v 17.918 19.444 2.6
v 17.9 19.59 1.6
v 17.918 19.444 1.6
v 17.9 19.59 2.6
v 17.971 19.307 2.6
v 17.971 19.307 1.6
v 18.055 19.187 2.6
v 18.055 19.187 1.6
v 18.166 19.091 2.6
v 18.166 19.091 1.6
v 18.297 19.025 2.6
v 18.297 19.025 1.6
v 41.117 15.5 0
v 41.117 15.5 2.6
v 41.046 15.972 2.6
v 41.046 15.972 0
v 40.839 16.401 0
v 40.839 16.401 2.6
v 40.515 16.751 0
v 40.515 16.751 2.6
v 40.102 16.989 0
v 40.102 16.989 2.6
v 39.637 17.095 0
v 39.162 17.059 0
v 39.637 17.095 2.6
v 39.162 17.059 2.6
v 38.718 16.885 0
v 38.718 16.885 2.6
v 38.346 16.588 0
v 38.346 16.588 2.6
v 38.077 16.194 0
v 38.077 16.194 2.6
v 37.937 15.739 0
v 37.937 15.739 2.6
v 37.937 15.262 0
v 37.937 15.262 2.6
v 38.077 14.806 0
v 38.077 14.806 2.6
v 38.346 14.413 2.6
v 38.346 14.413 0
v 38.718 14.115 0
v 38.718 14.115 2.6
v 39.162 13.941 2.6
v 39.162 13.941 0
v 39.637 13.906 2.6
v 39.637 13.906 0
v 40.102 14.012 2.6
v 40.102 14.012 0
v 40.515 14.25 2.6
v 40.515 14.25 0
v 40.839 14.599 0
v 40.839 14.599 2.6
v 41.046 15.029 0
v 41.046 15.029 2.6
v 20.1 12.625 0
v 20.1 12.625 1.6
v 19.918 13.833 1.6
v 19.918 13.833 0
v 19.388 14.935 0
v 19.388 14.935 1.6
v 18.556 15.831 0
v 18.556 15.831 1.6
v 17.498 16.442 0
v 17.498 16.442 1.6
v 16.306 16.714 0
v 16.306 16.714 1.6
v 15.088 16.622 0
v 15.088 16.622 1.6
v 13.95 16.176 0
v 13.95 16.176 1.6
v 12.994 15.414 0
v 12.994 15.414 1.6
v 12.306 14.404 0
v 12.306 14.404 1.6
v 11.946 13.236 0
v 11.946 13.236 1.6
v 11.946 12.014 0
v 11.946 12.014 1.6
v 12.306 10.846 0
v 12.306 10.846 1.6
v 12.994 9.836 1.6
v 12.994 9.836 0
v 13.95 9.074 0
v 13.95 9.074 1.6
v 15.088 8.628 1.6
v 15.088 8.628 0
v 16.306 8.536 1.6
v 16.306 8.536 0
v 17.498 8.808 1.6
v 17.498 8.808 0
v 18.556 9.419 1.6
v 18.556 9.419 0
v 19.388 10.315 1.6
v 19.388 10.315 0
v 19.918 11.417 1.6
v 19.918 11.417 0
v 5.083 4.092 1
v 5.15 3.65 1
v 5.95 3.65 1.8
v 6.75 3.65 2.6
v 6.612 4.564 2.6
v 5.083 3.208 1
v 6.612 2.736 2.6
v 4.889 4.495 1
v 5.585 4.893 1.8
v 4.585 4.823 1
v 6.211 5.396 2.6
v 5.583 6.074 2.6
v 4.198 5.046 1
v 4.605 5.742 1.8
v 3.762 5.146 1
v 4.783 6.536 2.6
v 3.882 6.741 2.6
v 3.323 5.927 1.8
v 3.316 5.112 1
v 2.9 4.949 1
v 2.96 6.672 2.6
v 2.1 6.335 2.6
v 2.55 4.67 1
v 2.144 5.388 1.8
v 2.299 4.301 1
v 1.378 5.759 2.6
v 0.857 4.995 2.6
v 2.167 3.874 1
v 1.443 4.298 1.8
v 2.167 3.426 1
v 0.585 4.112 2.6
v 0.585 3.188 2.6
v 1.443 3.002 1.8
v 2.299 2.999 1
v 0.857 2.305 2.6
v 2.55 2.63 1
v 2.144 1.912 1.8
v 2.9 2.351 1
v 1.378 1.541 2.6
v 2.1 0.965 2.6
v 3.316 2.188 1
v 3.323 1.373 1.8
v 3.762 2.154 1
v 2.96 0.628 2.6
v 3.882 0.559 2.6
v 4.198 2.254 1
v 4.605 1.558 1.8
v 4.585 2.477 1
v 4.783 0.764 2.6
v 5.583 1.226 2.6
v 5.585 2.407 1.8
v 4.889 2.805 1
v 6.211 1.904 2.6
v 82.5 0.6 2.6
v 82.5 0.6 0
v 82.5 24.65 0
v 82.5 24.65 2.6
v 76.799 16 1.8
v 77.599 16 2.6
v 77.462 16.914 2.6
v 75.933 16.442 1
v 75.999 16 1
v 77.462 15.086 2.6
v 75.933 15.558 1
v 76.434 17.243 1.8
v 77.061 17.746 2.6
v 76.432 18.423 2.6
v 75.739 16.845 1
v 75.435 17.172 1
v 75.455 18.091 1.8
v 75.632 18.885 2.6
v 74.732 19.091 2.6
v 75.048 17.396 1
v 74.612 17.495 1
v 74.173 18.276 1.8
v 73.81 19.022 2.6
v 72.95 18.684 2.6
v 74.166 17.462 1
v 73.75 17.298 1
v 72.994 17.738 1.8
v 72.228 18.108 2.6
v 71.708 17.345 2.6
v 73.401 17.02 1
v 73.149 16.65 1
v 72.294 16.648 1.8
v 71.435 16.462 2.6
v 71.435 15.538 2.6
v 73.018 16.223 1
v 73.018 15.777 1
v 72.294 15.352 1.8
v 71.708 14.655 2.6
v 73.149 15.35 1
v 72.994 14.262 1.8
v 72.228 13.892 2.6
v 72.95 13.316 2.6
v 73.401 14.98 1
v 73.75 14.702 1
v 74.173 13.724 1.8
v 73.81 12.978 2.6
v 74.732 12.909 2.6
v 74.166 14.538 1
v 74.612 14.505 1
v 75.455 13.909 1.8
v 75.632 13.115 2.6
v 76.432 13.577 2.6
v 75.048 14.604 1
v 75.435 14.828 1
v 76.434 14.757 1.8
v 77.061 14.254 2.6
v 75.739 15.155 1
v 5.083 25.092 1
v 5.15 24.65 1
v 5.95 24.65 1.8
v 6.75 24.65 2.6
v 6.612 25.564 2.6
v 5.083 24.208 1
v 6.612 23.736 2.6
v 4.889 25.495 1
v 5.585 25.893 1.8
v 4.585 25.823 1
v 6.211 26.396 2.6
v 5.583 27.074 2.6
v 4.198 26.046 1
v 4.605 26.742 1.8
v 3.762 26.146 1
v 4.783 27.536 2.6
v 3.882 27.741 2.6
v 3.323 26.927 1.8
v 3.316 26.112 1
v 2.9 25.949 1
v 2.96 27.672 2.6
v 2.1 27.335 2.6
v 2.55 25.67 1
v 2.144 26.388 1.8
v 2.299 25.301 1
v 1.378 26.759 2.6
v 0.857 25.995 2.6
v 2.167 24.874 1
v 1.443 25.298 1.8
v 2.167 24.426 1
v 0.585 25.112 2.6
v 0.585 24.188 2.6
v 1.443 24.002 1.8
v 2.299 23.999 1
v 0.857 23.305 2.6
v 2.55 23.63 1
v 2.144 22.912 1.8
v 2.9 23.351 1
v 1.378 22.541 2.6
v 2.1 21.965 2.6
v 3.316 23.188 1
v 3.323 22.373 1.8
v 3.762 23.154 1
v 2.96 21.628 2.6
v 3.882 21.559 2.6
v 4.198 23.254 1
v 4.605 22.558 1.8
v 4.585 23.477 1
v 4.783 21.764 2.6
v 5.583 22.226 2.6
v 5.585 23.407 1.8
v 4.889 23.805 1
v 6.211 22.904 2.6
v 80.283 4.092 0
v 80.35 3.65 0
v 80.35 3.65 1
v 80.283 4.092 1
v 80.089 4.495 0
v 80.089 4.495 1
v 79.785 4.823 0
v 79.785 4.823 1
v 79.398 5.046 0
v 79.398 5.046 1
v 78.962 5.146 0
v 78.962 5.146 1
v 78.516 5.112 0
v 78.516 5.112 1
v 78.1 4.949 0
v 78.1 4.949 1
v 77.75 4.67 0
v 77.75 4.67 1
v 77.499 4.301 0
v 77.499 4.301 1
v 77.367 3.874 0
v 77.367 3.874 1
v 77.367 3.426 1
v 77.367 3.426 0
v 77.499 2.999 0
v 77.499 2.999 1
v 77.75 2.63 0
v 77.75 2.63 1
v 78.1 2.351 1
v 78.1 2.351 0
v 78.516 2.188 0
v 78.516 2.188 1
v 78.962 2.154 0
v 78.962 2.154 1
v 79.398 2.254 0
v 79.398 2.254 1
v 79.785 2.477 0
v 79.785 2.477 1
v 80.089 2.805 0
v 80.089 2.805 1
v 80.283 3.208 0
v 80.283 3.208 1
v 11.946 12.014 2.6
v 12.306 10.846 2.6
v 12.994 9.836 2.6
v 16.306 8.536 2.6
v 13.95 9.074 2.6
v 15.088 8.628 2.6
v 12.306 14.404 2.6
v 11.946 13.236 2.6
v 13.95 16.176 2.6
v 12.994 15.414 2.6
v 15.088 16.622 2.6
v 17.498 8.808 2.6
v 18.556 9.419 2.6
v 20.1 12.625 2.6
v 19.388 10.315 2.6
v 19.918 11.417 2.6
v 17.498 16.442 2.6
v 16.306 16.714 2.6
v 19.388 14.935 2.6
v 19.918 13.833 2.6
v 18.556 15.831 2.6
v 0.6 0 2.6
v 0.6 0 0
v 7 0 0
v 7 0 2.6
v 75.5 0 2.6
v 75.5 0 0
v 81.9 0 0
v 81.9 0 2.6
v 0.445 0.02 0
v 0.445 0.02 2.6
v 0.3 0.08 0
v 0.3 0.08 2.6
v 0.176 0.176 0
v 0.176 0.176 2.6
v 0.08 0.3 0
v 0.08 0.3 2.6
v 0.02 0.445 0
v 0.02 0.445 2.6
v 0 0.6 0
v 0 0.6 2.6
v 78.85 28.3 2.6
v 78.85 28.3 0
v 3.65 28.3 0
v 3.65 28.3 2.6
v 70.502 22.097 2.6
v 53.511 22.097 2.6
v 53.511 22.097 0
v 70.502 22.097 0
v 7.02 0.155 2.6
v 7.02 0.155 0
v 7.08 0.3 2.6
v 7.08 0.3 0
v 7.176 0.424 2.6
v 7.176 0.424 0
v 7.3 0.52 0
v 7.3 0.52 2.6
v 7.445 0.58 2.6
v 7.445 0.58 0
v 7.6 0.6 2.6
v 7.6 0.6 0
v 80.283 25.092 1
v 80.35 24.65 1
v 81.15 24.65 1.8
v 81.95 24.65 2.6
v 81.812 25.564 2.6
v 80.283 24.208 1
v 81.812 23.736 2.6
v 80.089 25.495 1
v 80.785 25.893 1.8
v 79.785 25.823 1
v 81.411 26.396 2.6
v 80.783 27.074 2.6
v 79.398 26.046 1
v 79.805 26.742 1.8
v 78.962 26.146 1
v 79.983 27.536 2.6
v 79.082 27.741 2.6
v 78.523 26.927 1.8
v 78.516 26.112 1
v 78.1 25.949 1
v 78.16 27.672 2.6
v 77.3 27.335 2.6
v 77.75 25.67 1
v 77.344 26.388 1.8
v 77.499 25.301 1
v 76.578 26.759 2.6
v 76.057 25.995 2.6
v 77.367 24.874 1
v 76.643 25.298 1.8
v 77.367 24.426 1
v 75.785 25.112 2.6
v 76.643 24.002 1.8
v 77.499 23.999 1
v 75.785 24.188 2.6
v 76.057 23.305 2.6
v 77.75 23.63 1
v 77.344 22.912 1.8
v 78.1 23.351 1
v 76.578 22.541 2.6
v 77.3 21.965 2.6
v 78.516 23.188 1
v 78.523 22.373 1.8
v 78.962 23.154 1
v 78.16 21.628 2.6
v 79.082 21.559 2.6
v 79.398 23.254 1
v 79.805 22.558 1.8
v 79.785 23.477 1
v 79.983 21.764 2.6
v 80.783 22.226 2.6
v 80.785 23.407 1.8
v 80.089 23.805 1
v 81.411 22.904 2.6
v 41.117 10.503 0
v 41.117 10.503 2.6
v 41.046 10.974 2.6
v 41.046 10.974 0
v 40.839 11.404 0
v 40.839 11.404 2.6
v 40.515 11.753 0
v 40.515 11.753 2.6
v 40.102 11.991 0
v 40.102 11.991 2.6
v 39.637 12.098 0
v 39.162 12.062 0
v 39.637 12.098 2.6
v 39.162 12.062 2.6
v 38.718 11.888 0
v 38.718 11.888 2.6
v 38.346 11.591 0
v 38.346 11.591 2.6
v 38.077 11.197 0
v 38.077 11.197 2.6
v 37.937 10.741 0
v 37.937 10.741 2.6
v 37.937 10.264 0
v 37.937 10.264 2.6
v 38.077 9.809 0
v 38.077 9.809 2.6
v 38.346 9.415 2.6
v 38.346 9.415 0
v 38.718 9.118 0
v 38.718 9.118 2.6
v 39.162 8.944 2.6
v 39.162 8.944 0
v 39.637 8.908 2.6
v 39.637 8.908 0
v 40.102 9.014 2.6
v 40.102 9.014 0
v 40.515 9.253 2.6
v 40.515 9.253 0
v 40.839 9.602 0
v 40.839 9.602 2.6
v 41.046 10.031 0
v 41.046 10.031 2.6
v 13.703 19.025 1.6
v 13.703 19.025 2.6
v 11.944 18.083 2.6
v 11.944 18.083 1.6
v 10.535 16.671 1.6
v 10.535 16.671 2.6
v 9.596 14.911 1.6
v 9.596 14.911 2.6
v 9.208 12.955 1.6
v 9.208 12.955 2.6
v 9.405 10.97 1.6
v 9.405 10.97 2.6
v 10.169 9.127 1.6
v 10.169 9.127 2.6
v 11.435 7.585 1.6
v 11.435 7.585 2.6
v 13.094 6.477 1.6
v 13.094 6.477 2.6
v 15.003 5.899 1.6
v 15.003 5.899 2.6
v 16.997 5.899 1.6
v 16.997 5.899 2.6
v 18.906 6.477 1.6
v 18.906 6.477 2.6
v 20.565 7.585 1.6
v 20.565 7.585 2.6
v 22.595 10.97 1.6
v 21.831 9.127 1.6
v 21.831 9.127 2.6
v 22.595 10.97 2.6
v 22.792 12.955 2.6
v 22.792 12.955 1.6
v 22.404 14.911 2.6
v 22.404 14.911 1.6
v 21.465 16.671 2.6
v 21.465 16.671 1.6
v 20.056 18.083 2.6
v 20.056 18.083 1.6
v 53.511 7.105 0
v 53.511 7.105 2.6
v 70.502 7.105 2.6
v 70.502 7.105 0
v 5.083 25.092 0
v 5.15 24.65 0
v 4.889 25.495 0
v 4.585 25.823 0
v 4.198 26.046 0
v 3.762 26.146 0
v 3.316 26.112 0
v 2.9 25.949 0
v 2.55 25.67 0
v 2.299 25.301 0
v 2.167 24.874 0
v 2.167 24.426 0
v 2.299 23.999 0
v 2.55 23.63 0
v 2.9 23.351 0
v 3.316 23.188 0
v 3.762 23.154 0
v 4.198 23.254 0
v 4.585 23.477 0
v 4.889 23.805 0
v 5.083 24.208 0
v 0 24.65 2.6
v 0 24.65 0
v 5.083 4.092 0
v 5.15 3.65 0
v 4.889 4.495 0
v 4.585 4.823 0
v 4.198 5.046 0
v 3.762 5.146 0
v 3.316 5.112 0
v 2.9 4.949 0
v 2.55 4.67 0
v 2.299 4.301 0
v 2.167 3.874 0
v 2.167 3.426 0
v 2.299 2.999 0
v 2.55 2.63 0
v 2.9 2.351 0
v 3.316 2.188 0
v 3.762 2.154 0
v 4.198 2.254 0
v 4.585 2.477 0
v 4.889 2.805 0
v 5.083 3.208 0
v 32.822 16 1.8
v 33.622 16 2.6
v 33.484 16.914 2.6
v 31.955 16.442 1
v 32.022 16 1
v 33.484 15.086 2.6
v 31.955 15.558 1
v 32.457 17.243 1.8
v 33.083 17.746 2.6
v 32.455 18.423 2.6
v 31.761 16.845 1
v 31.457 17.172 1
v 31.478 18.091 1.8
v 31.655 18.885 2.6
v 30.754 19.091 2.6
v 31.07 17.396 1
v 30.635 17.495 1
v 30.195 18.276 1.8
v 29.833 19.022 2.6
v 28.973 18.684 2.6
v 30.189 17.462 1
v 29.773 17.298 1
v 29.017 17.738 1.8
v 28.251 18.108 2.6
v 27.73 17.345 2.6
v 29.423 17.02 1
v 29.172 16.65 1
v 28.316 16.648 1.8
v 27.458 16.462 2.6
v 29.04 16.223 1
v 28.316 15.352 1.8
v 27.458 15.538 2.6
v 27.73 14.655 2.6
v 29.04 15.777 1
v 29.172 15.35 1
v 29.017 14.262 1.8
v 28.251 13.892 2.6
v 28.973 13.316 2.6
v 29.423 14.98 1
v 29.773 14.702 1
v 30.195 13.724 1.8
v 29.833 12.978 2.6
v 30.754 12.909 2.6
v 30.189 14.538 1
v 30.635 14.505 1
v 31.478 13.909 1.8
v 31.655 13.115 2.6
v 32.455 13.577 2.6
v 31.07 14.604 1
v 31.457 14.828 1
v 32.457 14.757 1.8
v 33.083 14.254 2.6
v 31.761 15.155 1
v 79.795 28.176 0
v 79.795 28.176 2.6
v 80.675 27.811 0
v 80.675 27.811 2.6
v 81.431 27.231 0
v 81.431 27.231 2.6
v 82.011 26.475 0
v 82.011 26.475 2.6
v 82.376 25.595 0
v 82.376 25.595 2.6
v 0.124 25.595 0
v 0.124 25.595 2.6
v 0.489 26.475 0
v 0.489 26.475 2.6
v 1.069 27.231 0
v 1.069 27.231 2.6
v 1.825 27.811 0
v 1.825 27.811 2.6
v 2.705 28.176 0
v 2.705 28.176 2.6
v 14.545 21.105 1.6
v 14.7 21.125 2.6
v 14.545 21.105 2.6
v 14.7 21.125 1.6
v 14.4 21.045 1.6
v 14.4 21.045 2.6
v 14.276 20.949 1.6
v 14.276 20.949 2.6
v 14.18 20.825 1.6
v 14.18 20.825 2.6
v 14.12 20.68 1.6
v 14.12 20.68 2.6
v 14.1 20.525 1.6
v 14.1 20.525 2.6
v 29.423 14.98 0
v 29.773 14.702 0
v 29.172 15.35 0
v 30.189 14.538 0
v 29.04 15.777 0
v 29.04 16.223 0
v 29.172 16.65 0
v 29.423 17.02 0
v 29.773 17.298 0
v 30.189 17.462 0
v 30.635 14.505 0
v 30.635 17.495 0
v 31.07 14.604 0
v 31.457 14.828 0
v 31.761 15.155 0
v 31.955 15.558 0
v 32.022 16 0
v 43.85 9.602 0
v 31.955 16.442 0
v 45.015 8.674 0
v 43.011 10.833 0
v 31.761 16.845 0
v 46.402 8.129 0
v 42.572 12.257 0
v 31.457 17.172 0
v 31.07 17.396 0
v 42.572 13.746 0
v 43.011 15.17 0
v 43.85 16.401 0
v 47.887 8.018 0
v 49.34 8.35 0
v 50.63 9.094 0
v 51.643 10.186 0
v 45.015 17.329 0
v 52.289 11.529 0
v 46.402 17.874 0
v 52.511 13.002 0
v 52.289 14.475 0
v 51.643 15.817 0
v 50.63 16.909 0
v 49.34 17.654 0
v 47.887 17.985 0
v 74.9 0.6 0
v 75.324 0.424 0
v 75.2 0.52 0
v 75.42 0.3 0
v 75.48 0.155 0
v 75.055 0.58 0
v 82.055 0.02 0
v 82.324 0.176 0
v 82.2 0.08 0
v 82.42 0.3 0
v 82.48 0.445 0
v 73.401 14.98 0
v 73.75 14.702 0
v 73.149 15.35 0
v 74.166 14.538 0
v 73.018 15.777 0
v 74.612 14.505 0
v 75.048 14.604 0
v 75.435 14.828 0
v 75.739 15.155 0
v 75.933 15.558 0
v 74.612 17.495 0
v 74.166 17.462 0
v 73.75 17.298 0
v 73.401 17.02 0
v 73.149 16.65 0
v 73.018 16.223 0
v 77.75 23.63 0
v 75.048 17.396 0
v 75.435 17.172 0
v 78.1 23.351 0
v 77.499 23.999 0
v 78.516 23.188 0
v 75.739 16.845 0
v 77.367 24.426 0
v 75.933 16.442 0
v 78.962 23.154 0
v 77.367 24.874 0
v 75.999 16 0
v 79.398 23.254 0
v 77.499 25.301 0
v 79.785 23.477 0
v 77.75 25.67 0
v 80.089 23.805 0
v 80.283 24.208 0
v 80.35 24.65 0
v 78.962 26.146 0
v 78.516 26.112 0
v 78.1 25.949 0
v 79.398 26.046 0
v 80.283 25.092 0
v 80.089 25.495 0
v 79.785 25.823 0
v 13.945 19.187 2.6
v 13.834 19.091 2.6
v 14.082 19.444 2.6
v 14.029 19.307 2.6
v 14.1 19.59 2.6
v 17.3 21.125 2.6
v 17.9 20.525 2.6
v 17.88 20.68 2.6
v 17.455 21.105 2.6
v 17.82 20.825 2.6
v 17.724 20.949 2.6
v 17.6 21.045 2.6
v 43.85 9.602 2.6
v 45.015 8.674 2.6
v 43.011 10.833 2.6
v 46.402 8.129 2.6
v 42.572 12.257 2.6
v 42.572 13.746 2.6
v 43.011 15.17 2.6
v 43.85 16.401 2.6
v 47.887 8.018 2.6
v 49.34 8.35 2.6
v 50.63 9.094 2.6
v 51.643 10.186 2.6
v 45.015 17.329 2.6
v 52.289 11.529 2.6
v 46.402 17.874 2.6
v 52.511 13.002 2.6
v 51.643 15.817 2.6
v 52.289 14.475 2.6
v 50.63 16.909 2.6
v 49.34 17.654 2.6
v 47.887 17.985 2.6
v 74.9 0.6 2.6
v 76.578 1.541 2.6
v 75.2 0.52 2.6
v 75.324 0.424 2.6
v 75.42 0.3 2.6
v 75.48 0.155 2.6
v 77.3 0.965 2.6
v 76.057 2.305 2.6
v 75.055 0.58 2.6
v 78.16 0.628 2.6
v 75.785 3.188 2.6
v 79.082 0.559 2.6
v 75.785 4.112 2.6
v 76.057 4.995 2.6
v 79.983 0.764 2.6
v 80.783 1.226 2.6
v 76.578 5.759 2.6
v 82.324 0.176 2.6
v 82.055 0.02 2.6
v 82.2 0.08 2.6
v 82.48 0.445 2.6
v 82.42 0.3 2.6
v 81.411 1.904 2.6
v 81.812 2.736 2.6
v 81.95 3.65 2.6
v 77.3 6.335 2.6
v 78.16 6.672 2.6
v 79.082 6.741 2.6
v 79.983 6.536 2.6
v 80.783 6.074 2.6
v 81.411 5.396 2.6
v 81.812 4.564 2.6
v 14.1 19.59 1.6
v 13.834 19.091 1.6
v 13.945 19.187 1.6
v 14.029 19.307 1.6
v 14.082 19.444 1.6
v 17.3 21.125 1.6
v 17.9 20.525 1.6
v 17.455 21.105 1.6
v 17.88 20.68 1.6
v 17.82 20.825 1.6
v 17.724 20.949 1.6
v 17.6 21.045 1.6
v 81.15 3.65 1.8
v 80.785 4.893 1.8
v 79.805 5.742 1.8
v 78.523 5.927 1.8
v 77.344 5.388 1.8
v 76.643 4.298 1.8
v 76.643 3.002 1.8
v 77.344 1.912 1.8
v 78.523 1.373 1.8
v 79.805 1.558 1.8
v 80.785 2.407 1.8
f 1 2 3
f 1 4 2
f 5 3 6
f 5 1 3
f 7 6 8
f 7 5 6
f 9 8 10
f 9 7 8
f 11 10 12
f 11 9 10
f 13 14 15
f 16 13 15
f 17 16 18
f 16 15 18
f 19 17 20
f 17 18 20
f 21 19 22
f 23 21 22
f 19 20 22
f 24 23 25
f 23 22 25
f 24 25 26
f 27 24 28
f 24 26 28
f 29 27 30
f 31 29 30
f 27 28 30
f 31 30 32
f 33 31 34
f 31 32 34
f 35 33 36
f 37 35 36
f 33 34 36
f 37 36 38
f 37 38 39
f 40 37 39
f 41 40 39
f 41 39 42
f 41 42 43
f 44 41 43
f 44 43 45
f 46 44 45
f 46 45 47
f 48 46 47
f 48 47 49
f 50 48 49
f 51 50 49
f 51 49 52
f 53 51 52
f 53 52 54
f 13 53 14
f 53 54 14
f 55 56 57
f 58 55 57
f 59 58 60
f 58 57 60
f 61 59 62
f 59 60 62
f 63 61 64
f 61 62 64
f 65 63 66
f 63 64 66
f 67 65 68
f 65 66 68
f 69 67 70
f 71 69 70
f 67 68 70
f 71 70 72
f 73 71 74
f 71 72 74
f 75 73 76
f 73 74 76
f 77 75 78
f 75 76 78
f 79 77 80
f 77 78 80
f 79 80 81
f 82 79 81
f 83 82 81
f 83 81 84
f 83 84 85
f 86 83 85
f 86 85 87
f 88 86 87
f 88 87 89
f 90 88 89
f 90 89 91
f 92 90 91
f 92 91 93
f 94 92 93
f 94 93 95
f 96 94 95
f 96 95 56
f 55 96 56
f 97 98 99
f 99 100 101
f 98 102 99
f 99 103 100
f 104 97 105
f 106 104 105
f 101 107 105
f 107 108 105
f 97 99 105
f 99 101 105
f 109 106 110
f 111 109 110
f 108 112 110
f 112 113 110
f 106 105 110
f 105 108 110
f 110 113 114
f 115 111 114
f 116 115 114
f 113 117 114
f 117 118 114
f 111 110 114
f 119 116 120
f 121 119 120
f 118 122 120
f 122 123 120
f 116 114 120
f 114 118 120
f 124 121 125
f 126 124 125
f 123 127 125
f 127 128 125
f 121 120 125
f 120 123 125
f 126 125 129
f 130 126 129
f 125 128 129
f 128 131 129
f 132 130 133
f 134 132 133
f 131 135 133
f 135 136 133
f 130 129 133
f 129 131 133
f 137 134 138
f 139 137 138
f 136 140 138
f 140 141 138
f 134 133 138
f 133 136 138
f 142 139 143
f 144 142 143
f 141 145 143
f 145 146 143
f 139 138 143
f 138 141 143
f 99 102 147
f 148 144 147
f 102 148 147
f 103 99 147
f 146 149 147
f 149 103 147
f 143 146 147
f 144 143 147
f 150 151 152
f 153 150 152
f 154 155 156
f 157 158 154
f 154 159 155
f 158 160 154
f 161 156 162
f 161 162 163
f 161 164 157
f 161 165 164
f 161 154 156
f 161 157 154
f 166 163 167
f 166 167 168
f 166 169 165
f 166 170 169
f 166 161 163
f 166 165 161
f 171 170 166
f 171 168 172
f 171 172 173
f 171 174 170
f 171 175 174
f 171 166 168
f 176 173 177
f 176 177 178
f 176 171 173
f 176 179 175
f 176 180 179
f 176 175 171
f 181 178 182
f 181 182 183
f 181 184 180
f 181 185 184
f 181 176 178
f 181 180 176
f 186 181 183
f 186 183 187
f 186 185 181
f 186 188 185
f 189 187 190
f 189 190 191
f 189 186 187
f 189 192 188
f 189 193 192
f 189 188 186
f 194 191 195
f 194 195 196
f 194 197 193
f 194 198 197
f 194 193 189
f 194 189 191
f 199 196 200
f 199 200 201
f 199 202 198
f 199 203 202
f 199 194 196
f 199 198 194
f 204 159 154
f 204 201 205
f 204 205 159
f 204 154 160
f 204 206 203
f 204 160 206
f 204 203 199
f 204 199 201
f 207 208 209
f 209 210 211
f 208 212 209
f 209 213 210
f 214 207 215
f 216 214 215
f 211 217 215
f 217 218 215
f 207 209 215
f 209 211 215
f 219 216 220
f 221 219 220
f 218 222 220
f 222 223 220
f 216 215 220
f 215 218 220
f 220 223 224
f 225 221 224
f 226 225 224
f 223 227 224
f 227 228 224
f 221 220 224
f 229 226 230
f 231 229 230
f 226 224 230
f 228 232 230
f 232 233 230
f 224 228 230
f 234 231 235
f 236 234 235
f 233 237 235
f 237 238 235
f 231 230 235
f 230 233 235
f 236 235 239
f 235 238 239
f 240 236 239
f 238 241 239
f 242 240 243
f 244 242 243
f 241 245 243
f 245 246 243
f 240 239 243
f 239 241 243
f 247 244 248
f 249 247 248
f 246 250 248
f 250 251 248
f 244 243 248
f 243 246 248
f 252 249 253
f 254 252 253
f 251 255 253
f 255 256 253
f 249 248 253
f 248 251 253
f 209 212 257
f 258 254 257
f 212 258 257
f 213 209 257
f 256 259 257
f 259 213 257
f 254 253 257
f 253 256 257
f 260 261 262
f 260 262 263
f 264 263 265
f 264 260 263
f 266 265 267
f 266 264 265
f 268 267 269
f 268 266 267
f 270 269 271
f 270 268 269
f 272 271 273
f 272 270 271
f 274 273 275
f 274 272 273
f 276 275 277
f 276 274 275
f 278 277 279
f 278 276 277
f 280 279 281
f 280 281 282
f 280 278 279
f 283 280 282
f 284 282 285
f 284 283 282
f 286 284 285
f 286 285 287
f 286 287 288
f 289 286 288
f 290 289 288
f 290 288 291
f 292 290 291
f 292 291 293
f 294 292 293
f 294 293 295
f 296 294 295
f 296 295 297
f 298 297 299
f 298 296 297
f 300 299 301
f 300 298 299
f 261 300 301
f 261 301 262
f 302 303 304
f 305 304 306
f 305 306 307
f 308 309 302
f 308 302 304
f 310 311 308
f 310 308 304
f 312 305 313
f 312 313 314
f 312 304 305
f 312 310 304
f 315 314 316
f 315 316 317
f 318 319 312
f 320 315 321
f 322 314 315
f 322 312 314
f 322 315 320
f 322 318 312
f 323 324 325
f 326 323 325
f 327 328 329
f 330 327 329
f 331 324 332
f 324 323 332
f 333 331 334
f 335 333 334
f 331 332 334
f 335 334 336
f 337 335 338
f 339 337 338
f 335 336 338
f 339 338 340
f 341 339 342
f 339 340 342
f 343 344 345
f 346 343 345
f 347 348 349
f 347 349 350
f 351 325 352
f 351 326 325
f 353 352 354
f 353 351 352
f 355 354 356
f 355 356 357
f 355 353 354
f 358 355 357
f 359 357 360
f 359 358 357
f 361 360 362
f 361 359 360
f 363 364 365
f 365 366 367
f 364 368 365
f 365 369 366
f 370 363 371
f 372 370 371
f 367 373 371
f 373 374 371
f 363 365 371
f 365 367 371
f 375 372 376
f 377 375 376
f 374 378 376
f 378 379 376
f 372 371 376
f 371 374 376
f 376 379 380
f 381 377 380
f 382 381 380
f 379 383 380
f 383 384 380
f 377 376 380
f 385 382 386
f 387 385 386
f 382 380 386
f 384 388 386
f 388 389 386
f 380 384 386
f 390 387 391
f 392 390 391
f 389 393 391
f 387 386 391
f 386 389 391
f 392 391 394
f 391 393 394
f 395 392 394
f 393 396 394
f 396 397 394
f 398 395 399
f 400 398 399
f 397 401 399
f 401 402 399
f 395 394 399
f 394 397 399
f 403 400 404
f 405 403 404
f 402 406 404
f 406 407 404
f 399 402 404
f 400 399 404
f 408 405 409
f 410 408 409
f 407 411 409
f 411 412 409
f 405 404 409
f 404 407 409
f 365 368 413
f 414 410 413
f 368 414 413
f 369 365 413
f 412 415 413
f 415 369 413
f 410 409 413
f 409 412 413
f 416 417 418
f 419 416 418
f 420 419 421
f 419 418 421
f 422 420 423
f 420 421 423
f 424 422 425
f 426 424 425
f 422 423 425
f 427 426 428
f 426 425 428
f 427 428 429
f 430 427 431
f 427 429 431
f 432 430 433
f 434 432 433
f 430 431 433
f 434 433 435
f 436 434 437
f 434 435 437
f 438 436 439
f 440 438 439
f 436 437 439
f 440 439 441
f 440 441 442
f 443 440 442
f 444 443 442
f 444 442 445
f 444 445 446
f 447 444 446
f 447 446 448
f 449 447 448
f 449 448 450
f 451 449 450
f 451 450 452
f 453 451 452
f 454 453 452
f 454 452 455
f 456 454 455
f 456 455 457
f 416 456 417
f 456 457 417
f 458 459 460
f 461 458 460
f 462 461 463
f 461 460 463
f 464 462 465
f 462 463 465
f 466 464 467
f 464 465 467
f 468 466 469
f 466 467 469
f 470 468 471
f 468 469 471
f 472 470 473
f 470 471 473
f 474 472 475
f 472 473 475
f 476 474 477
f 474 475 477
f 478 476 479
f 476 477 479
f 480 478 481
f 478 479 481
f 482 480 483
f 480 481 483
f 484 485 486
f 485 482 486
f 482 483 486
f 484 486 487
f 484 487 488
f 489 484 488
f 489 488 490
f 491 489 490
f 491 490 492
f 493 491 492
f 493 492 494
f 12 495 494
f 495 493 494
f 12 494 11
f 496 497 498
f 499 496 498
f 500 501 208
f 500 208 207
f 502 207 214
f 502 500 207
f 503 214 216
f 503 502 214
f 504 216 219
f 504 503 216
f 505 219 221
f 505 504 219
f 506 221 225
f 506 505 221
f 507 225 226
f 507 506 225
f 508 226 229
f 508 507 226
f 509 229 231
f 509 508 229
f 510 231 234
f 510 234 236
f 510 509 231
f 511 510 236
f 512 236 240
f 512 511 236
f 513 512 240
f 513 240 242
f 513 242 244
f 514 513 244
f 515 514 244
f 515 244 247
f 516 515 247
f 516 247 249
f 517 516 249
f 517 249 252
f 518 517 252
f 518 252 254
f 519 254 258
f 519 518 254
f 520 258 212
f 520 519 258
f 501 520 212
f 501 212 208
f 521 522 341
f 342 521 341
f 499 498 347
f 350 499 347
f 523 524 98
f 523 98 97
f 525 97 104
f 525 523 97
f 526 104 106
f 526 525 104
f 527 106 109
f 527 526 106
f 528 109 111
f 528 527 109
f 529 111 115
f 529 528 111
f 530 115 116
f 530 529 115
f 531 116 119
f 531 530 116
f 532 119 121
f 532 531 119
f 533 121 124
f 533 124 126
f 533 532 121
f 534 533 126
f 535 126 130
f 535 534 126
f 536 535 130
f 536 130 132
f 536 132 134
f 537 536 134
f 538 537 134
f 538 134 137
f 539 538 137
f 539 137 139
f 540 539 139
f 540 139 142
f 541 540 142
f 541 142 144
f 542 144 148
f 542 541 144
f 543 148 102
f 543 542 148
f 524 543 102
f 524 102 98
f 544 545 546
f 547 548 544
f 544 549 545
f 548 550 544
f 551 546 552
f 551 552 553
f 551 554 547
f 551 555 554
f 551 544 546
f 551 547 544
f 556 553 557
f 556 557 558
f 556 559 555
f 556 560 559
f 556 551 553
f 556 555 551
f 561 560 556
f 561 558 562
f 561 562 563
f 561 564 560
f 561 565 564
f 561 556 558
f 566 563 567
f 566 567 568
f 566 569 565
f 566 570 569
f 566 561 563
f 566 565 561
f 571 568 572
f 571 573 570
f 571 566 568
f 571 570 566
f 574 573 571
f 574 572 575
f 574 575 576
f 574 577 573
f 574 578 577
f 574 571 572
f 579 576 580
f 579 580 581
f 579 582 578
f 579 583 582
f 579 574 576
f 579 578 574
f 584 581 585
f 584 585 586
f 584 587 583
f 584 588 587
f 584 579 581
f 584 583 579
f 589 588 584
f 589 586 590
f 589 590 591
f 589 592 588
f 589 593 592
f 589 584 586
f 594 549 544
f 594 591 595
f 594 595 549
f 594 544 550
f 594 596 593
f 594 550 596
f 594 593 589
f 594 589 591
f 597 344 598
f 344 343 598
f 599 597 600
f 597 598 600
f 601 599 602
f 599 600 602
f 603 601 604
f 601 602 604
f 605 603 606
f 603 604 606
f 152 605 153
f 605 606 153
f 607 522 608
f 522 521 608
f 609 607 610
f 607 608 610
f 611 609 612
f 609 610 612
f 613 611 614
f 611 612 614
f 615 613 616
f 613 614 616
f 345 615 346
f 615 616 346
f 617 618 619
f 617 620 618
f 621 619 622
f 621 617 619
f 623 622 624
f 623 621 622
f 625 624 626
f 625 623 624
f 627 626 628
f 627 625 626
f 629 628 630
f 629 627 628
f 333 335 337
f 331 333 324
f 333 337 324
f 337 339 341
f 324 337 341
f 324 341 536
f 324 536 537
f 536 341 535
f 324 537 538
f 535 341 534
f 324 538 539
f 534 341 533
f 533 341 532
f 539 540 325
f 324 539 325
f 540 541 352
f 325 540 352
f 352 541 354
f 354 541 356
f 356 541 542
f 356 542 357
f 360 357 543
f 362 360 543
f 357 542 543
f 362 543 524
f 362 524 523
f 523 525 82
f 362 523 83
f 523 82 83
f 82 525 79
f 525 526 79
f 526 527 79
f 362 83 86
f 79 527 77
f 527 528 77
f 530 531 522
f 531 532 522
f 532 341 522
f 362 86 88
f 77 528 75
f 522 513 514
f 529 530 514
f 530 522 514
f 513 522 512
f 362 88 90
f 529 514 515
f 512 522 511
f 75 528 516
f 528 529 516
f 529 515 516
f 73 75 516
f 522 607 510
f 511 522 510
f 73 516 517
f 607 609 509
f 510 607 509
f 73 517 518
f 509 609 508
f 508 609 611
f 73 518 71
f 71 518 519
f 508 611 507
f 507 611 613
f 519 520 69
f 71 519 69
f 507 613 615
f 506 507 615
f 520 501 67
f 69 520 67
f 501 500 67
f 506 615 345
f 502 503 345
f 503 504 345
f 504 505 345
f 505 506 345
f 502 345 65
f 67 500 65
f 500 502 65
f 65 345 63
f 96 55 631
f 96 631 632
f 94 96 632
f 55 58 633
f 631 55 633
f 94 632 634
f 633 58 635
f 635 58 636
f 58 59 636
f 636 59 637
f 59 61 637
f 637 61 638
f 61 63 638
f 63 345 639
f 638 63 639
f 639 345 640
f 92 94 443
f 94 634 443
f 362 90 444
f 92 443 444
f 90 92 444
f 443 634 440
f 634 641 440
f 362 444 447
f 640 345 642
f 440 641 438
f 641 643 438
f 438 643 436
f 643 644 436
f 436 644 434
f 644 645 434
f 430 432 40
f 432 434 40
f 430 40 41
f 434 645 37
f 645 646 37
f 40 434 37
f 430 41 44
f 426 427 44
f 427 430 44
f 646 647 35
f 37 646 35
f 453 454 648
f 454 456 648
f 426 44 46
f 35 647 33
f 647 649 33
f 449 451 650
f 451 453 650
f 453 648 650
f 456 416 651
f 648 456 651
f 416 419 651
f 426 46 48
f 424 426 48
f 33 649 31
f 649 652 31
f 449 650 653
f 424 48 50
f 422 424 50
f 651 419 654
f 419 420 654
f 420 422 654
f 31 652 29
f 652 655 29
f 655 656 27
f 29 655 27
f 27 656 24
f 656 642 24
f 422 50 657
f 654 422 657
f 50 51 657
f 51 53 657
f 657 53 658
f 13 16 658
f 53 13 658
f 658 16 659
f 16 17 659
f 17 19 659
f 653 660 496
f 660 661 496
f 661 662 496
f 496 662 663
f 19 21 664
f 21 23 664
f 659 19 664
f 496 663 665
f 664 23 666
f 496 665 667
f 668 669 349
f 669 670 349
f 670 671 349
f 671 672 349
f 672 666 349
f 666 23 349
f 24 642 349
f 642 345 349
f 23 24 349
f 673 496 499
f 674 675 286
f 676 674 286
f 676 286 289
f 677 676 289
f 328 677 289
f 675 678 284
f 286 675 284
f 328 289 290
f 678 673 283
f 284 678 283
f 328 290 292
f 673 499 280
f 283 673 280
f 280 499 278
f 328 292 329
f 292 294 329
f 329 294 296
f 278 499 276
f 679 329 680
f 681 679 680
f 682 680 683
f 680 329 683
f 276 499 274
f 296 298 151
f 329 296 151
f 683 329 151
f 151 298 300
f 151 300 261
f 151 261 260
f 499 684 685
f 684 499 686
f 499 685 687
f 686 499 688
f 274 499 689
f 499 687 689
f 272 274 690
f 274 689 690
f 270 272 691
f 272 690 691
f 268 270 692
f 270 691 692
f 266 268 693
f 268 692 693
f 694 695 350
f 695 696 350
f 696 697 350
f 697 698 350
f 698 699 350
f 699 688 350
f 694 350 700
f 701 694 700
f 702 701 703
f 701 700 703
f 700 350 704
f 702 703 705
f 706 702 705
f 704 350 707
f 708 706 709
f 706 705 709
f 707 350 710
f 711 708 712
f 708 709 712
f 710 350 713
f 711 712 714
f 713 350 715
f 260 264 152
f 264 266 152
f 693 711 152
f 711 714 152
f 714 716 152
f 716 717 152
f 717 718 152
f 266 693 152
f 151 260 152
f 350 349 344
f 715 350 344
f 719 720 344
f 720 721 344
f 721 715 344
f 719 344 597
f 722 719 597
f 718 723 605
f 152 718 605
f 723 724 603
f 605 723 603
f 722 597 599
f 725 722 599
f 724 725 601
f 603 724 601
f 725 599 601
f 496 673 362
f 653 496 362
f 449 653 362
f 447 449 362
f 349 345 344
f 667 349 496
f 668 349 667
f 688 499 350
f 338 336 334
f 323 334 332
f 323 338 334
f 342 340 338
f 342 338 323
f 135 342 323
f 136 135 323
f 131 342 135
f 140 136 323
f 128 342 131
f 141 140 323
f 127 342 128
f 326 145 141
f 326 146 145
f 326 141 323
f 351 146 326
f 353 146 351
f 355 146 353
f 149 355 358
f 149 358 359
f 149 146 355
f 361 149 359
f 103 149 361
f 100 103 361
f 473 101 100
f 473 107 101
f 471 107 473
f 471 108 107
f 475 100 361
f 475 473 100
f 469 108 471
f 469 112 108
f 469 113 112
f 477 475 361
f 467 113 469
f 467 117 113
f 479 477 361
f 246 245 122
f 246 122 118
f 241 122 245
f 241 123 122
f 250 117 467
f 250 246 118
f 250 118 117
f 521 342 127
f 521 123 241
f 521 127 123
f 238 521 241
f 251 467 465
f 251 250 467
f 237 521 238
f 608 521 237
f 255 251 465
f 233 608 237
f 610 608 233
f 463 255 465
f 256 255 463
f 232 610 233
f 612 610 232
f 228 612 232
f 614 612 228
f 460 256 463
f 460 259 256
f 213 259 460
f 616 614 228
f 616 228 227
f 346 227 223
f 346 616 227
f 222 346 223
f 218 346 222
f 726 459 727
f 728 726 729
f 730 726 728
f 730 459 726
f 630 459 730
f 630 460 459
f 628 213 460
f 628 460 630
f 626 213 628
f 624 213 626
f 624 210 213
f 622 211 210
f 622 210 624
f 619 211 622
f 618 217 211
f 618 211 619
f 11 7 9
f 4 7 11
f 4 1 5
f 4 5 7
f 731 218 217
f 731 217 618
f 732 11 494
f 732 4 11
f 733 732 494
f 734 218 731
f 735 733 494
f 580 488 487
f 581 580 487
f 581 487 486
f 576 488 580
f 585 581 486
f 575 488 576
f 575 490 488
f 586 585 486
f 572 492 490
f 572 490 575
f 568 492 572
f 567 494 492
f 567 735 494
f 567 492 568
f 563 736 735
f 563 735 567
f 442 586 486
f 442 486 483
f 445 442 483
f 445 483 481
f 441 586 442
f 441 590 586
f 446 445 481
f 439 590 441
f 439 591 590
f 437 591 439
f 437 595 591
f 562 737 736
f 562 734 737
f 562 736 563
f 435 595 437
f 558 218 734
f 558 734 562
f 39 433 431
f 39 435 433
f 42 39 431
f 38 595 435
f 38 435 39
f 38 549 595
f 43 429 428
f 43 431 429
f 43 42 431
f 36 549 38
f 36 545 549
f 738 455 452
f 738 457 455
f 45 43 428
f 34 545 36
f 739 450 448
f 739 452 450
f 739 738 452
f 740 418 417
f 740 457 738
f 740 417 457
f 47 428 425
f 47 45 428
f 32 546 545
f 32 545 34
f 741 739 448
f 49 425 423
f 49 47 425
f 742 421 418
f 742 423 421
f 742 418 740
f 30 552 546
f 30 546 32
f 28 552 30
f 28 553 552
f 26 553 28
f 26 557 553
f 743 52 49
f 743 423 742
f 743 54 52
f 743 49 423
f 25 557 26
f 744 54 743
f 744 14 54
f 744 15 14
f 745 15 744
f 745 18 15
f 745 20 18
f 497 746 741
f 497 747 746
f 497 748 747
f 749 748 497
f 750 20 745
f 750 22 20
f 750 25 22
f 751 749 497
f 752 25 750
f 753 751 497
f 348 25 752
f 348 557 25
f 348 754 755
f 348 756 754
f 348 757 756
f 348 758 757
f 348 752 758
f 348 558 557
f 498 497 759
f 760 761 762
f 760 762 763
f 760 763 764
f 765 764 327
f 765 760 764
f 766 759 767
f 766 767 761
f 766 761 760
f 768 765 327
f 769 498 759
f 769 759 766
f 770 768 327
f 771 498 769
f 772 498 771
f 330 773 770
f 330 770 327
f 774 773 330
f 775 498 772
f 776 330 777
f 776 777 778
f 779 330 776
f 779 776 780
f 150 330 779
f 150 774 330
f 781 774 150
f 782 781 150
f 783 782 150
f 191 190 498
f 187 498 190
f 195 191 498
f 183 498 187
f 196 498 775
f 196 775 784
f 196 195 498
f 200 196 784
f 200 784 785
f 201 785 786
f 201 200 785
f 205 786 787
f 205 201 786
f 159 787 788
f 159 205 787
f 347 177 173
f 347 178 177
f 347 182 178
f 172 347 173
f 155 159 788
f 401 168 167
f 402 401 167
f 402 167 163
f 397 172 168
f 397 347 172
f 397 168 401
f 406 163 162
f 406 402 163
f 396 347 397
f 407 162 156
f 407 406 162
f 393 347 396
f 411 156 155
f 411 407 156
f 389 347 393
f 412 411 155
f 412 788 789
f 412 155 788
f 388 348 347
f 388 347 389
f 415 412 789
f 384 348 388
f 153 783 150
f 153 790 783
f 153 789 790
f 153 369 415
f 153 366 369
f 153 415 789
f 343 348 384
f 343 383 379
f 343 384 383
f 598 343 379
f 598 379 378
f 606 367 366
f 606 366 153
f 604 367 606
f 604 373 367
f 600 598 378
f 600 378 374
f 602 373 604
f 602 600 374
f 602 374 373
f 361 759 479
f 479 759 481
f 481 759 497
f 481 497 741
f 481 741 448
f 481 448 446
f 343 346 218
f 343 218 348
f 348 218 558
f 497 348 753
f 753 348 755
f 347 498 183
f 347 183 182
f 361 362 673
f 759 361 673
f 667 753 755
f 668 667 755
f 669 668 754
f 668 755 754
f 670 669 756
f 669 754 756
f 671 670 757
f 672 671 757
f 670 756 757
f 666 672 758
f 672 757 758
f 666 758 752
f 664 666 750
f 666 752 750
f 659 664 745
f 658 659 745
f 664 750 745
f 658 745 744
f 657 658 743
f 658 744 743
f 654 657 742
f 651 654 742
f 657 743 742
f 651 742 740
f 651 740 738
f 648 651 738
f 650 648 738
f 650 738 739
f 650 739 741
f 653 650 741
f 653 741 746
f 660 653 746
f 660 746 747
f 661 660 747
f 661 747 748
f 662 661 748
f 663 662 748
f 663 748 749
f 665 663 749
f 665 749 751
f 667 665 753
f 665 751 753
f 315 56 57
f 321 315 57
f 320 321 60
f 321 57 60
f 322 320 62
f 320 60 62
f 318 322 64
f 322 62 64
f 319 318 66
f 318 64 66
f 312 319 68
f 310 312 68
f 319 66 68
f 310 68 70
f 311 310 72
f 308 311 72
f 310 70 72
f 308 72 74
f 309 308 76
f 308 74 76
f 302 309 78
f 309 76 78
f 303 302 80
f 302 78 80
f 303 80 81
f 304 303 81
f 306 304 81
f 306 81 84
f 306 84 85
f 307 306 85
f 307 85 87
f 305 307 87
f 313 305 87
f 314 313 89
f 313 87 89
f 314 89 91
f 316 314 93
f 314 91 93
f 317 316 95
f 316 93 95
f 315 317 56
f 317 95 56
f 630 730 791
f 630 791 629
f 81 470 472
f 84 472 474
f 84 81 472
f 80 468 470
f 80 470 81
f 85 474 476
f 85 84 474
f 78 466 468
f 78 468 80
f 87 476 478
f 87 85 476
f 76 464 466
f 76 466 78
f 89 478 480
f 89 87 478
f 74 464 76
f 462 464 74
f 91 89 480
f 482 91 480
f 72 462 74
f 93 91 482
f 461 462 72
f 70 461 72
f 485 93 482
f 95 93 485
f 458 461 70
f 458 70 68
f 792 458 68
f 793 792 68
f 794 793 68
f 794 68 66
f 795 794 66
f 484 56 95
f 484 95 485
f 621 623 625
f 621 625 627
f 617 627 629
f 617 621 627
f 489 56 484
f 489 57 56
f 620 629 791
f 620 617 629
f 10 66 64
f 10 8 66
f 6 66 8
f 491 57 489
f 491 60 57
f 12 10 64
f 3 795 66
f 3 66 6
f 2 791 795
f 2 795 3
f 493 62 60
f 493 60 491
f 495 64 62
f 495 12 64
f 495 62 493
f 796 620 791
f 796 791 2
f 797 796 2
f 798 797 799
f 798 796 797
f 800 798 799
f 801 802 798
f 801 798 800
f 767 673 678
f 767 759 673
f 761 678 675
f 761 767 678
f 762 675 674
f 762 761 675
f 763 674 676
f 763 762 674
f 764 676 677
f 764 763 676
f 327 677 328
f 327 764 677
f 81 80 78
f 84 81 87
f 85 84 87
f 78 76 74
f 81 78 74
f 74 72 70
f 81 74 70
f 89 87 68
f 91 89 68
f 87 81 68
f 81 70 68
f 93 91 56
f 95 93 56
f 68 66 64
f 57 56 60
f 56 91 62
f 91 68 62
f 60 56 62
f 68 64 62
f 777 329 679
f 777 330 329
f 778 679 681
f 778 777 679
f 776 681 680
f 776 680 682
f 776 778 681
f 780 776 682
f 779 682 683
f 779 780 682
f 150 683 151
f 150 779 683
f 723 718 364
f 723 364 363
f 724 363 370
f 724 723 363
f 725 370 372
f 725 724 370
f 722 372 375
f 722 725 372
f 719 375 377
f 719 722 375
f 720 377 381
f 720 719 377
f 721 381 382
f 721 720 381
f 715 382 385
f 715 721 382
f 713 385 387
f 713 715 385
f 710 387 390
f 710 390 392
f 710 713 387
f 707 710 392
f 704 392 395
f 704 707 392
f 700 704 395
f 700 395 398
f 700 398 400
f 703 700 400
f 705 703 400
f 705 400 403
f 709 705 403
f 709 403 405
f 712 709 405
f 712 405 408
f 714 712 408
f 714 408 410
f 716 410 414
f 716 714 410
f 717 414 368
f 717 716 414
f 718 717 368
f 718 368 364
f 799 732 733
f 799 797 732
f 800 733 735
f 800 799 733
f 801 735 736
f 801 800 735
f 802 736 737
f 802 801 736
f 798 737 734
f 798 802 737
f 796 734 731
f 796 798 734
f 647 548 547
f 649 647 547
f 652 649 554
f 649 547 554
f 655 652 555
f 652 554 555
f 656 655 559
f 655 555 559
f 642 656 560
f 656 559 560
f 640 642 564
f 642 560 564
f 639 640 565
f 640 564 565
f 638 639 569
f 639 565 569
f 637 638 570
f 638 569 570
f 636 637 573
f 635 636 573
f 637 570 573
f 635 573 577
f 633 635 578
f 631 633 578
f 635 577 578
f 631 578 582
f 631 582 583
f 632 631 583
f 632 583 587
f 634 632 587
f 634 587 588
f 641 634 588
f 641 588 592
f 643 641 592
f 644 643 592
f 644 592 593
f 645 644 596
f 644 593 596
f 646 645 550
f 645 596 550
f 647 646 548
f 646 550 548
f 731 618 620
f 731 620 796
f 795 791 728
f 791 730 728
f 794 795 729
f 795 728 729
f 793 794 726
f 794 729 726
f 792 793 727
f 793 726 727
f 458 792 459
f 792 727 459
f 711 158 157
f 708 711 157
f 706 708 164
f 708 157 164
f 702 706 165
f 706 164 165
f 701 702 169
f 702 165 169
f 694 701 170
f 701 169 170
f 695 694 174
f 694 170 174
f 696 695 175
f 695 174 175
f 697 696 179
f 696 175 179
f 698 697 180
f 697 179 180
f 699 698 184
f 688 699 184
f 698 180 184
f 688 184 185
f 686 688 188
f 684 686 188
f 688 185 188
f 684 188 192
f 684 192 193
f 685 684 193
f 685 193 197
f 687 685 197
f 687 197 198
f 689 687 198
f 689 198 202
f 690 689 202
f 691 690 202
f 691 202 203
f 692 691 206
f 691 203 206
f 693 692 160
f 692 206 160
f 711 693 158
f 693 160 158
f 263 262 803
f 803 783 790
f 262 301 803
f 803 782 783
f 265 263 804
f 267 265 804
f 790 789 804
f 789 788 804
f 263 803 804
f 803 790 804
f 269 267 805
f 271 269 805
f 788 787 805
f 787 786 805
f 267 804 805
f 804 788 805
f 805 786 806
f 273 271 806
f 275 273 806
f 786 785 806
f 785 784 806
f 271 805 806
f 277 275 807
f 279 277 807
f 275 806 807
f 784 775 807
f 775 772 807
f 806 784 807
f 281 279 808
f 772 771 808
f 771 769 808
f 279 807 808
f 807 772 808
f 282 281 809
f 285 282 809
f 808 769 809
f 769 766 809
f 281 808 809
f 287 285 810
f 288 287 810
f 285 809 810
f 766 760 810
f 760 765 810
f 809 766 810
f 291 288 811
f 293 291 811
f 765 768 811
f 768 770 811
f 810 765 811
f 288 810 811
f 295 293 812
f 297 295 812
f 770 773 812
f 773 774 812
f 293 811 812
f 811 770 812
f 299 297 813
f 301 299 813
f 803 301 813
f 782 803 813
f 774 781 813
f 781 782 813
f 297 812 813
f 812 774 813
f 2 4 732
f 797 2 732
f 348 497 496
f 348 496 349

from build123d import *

# Parameters (mm, degrees)
SKETCH1_R           = 1.5
BOSS_EXTRUDE1_DEPTH = 2.6
FILLET1_R           = 3.65
FILLET2_R           = 0.6
CHAMFER1_SIZE       = 1.6
SKETCH2_R           = 1.499234097
SKETCH2_R_2         = 4.997446991
SKETCH2_R_3         = 1.599183037
SKETCH2_W           = 16.99131977
SKETCH2_H           = 14.992340973
CUT_EXTRUDE1_DEPTH  = 2.6
CHAMFER2_SIZE       = 1.6
SKETCH3_R           = 6.8
CUT_EXTRUDE2_DEPTH  = 1
SKETCH4_R           = 4.1
CUT_EXTRUDE3_DEPTH  = 3
SKETCH5_W           = 3.8
SKETCH5_H           = 3.391058966
CUT_EXTRUDE4_DEPTH  = 1
FILLET3_R           = 0.6
SKETCH6_R           = 4.1
BOSS_EXTRUDE3_DEPTH = 1


with BuildPart() as part:
    # Sketch1 → Boss-Extrude1 (new body)
    with BuildSketch(Plane.XY):
        Polygon((7, 0), (7, 0.6), (75.5, 0.6), (75.5, 0), (82.5, 0), (82.5, 28.3), (0, 28.3), (0, 0), align=None)
        with Locations((3.65, 24.65)):
            Circle(SKETCH1_R, mode=Mode.SUBTRACT)
        with Locations((3.65, 3.65)):
            Circle(SKETCH1_R, mode=Mode.SUBTRACT)
        with Locations((78.85, 24.65)):
            Circle(SKETCH1_R, mode=Mode.SUBTRACT)
        with Locations((78.85, 3.65)):
            Circle(SKETCH1_R, mode=Mode.SUBTRACT)
    extrude(amount=BOSS_EXTRUDE1_DEPTH)

    # Fillet1
    fillet1_edges = [part.edges().sort_by_distance(p)[0] for p in [
        (0, 28.3, 1.3),
        (82.5, 28.3, 1.3),
    ]]
    fillet(fillet1_edges, radius=FILLET1_R)

    # Fillet2
    fillet2_edges = [part.edges().sort_by_distance(p)[0] for p in [
        (75.5, 0.6, 1.3),
        (7, 0.6, 1.3),
    ]]
    fillet(fillet2_edges, radius=FILLET2_R - 0.0001)  # a hair under: the kernel refuses the full size
    fillet2_2_edges = [part.edges().sort_by_distance(p)[0] for p in [
        (82.5, 0, 1.3),
        (0, 0, 1.3),
    ]]
    fillet(fillet2_2_edges, radius=FILLET2_R)

    # Chamfer1
    chamfer1_edges = [part.edges().sort_by_distance(p)[0] for p in [
        (2.15, 24.65, 2.6),
        (2.15, 3.65, 2.6),
        (77.35, 24.65, 2.6),
        (77.35, 3.65, 2.6),
    ]]
    chamfer(chamfer1_edges, length=CHAMFER1_SIZE)

    # Sketch2 → Cut-Extrude1 (cut)
    with BuildSketch(Plane.XY.offset(2.6)):
        with Locations((74.5, 16)):
            Circle(SKETCH2_R)
        with Locations((30.522466477, 16)):
            Circle(SKETCH2_R)
        with Locations((47.513786247, 13.001531805)):
            Circle(SKETCH2_R_2)
        with Locations((39.517871061, 15.500255301)):
            Circle(SKETCH2_R_3)
        with Locations((39.517871061, 10.50280831)):
            Circle(SKETCH2_R_3)
        with Locations((62.006382522, 14.600714843)):
            Rectangle(SKETCH2_W, SKETCH2_H)
    extrude(amount=-CUT_EXTRUDE1_DEPTH, mode=Mode.SUBTRACT)

    # Chamfer2
    chamfer2_edges = [part.edges().sort_by_distance(p)[0] for p in [
        (73.000765903, 16, 2.6),
        (29.023232379, 16, 2.6),
    ]]
    chamfer(chamfer2_edges, length=CHAMFER2_SIZE)

    # Sketch3 → Cut-Extrude2 (cut)
    with BuildSketch(Plane.XY.offset(2.6)):
        with Locations((16, 12.625)):
            Circle(SKETCH3_R)
    extrude(amount=-CUT_EXTRUDE2_DEPTH, mode=Mode.SUBTRACT)

    # Sketch4 → Cut-Extrude3 (cut)
    with BuildSketch(Plane.XY.offset(1.6)):
        with Locations((16, 12.625)):
            Circle(SKETCH4_R)
    extrude(amount=-CUT_EXTRUDE3_DEPTH, mode=Mode.SUBTRACT)

    # Sketch5 → Cut-Extrude4 (cut)
    with BuildSketch(Plane.XY.offset(2.6)):
        with Locations((16, 19.429470517)):
            Rectangle(SKETCH5_W, SKETCH5_H)
    extrude(amount=-CUT_EXTRUDE4_DEPTH, mode=Mode.SUBTRACT)

    # Fillet3
    fillet3_edges = [part.edges().sort_by_distance(p)[0] for p in [
        (14.1, 19.154165337, 2.1),
        (17.9, 19.154165337, 2.1),
        (17.9, 21.125, 2.1),
        (14.1, 21.125, 2.1),
    ]]
    fillet(fillet3_edges, radius=FILLET3_R)


with BuildPart() as body_2:
    # Sketch6 → Boss-Extrude3 (new body)
    with BuildSketch(Plane.XY.offset(1.6)):
        with Locations((16, 12.625)):
            Circle(SKETCH6_R)
    extrude(amount=BOSS_EXTRUDE3_DEPTH)


solid = Compound([part.part, body_2.part])
